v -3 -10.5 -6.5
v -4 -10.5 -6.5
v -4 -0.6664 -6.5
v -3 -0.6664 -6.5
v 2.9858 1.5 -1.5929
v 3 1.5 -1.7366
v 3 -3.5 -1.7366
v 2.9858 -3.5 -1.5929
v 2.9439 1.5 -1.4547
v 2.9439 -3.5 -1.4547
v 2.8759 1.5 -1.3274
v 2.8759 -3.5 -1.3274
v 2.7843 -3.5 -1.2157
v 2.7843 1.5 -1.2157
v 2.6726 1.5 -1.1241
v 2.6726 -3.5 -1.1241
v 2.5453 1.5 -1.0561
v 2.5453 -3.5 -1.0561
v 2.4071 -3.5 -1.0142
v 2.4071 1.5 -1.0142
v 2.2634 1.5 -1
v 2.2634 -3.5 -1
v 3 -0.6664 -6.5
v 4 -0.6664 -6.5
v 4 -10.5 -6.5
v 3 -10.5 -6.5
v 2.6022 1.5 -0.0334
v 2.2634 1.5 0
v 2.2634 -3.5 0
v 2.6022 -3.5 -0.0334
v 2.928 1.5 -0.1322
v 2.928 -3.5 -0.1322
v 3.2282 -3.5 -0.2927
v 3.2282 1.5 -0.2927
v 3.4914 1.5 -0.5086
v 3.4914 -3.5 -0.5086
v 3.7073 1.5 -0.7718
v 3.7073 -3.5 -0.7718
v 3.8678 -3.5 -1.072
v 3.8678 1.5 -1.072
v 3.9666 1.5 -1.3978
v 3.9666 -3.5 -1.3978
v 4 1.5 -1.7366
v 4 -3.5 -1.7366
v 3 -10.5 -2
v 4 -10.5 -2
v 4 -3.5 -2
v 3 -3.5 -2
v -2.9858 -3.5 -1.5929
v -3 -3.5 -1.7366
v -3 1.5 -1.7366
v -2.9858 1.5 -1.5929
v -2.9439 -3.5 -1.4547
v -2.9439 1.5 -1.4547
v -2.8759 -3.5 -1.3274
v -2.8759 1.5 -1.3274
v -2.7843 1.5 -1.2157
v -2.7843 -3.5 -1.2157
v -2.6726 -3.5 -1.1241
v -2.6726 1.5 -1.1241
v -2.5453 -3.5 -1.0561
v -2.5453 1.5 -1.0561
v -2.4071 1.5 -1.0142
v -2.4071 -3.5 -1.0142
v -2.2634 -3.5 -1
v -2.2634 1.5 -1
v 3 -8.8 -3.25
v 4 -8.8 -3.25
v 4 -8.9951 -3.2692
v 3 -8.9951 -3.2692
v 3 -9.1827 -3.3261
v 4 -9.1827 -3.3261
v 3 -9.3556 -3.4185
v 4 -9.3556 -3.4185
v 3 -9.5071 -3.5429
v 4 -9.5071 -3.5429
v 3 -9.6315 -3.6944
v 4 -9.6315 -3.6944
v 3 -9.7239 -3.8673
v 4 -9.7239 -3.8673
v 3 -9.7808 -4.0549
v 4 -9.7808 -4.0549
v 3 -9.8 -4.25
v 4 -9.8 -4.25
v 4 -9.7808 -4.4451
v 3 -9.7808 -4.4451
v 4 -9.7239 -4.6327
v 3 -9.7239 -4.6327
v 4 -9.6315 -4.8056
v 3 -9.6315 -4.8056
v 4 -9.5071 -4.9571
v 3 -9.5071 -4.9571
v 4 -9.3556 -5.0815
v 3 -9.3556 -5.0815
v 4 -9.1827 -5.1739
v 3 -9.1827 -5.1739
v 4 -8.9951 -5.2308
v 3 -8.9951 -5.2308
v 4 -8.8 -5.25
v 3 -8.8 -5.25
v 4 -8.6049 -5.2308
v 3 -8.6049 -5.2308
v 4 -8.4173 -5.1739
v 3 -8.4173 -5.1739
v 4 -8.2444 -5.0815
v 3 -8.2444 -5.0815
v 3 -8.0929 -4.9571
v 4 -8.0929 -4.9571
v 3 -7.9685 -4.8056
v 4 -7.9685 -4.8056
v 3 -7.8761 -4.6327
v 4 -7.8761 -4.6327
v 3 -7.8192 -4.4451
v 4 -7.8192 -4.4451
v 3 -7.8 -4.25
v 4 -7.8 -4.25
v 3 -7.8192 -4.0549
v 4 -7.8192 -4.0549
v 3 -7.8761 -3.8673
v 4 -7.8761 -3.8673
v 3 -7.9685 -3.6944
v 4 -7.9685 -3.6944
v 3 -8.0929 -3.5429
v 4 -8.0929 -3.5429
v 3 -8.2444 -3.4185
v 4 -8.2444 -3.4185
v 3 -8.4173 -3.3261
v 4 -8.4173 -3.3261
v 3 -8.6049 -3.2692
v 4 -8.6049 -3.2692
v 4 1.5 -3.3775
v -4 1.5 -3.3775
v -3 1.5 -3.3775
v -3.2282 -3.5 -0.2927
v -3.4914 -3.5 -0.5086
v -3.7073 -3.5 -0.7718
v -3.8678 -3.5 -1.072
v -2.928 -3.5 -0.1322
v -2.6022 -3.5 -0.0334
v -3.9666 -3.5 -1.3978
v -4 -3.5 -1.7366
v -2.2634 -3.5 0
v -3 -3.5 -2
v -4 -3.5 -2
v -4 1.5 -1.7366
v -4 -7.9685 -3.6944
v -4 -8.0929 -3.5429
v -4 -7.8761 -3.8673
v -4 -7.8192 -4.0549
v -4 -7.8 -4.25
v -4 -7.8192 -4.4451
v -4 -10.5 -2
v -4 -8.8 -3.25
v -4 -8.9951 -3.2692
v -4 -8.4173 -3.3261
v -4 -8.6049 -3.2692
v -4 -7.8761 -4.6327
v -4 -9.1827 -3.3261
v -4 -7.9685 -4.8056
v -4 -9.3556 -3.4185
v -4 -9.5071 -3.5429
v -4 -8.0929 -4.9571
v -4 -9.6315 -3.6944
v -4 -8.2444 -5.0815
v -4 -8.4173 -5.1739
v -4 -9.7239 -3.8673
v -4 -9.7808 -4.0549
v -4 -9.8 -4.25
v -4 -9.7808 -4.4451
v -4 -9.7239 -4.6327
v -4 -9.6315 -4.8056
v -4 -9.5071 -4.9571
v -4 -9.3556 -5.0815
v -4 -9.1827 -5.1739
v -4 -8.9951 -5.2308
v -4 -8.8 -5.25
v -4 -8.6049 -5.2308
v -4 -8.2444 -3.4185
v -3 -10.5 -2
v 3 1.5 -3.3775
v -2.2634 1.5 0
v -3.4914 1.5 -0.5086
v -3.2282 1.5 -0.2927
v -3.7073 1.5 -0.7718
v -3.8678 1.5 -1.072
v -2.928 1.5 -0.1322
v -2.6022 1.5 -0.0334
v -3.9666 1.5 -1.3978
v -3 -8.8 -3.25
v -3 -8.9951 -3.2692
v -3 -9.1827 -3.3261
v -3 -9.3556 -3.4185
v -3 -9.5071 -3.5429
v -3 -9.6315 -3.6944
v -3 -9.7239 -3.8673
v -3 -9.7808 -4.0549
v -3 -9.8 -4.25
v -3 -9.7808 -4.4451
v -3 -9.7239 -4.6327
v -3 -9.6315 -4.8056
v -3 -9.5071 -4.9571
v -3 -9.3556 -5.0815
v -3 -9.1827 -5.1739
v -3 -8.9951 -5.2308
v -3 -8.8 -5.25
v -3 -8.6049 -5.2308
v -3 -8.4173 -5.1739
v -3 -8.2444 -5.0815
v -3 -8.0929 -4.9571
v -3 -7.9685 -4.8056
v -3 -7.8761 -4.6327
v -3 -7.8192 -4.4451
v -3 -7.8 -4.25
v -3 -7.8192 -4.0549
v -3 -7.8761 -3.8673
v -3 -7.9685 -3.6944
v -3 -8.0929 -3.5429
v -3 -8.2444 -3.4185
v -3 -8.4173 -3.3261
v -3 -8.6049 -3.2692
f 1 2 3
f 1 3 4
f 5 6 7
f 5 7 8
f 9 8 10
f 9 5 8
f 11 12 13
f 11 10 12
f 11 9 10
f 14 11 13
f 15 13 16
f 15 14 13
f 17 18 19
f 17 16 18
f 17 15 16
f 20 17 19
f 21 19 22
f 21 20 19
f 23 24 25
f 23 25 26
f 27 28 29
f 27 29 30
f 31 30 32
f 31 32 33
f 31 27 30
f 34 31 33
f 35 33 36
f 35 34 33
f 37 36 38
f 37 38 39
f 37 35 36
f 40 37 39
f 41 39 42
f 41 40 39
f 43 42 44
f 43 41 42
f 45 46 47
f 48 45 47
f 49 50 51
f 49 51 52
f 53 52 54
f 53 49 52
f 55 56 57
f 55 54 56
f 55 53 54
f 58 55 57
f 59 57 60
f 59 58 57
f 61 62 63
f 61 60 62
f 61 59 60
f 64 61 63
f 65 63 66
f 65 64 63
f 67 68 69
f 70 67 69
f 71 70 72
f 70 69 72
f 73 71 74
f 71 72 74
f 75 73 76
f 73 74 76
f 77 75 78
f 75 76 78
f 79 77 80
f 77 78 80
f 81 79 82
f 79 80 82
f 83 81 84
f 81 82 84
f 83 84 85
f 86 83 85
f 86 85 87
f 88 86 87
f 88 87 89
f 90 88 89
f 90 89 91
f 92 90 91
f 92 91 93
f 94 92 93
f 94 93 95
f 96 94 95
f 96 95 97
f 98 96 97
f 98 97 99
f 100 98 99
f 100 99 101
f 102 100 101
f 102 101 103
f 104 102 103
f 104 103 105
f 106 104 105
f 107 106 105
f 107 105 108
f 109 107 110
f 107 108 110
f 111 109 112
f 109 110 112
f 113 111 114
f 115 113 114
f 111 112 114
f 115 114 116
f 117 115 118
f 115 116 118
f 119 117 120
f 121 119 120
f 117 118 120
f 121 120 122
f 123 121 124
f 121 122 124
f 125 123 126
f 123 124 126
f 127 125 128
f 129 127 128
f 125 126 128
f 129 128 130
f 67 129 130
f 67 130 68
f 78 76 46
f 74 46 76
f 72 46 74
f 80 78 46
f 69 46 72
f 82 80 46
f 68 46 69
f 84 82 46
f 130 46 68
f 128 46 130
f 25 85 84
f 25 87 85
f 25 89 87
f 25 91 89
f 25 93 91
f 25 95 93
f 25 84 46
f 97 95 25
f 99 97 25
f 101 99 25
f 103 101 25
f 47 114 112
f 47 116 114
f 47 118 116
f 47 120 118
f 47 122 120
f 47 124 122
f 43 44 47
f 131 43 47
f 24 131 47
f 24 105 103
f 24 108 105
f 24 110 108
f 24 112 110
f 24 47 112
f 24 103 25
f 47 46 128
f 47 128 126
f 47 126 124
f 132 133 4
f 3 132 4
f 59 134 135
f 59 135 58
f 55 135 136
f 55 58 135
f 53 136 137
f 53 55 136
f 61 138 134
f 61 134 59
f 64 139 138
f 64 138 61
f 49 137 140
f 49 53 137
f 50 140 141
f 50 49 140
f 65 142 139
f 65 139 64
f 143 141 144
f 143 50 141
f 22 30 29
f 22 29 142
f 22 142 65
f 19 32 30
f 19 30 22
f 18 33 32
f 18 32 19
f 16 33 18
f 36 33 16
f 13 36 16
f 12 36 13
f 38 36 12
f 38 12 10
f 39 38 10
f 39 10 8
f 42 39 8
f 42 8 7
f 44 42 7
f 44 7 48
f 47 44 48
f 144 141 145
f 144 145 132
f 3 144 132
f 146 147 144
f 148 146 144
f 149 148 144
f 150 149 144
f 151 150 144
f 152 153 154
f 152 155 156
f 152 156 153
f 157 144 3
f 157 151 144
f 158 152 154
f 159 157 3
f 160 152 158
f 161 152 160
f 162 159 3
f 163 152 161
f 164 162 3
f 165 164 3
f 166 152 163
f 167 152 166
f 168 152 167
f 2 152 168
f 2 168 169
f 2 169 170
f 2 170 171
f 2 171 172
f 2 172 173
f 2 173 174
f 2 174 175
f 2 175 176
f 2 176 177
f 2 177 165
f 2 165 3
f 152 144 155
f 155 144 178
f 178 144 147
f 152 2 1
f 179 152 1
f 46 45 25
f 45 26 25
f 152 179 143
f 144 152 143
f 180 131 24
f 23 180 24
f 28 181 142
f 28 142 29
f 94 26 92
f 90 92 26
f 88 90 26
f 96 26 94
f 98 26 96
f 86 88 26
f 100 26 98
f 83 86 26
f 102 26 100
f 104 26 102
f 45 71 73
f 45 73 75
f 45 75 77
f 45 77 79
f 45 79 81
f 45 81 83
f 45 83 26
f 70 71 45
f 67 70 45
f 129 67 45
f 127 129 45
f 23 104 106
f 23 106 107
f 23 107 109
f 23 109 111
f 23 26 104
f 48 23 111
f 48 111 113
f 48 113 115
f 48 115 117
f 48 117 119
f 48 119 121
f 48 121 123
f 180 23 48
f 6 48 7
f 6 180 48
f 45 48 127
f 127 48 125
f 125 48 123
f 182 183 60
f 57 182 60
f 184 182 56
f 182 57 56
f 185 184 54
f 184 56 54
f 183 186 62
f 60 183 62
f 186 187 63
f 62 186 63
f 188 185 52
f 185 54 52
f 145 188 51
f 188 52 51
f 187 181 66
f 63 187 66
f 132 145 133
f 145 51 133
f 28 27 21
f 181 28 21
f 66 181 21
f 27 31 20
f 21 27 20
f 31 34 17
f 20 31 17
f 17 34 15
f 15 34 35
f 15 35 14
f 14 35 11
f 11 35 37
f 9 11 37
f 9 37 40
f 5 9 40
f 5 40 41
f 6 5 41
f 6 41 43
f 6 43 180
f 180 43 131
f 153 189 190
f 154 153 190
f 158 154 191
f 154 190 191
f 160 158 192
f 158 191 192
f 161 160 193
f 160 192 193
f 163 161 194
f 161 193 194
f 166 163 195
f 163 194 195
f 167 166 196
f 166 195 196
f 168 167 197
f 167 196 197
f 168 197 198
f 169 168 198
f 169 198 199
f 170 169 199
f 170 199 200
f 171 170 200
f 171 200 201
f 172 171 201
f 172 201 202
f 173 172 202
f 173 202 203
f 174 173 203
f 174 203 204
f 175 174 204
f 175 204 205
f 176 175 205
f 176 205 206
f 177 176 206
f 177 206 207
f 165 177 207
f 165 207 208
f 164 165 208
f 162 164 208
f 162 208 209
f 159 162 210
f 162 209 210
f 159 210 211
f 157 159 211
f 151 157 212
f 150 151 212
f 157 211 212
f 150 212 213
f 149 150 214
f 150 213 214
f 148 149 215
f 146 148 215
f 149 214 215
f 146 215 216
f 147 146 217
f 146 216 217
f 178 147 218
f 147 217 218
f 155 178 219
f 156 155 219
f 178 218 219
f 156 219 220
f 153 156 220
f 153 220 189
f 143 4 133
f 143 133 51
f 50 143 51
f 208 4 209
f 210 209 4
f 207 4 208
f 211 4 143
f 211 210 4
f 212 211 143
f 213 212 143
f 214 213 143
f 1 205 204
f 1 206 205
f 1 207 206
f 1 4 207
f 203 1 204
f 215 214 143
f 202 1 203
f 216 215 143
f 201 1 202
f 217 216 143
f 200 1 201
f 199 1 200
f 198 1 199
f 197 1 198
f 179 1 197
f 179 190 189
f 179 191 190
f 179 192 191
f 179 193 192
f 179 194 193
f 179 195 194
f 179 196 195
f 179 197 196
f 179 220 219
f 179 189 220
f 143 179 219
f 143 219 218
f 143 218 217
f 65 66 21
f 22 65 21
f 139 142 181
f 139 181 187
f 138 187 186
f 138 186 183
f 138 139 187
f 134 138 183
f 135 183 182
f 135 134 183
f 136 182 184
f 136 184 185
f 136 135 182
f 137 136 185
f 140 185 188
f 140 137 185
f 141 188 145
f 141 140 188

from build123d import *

# Parameters (mm, degrees)
CROQUIS1_W                         = 8
CROQUIS1_H                         = 21
BRIDA_BASE1_DEPTH                  = 1
BRIDA_DE_ARISTA1_STRIP_W           = 5.4732
BRIDA_DE_ARISTA1_STRIP_H           = 1
BRIDA_DE_ARISTA1_STRIP_CUT_DEPTH   = 21
BRIDA_DE_ARISTA1_STRIP_2_W         = 5.4732
BRIDA_DE_ARISTA1_STRIP_2_H         = 1
BRIDA_DE_ARISTA1_STRIP_CUT_2_DEPTH = 21
BRIDA_DE_ARISTA1_DEPTH             = 21
BRIDA_DE_ARISTA1_BEND_DEPTH        = 21
CROQUIS34_W                        = 2
CROQUIS34_H                        = 7
CORTAR_EXTRUIR1_DEPTH              = 10
CORTAR_EXTRUIR2_REACH              = 16.714
CROQUIS35_R                        = 1
CORTAR_EXTRUIR3_DEPTH              = 10


# Sheet-metal steps are written as plain solids
with BuildPart() as part:
    # Croquis1 → Brida base1 (new body)
    with BuildSketch(Plane.XY):
        Rectangle(CROQUIS1_W, CROQUIS1_H)
    extrude(amount=-BRIDA_BASE1_DEPTH)

    # Brida de arista1 strip (across the edge) → Brida de arista1 strip cut (cut)
    with BuildSketch(Plane(origin=(-4, -10.5, -1), x_dir=(1, 0, 0), z_dir=(0, 1, 0))):
        with Locations((-1, -0.5)):
            Rectangle(BRIDA_DE_ARISTA1_STRIP_W, BRIDA_DE_ARISTA1_STRIP_H)
    extrude(amount=BRIDA_DE_ARISTA1_STRIP_CUT_DEPTH, mode=Mode.SUBTRACT)

    # Brida de arista1 strip 2 (across the edge) → Brida de arista1 strip cut 2 (cut)
    with BuildSketch(Plane(origin=(4, 10.5, -1), x_dir=(-1, 0, 0), z_dir=(0, -1, 0))):
        with Locations((-1, -0.5)):
            Rectangle(BRIDA_DE_ARISTA1_STRIP_2_W, BRIDA_DE_ARISTA1_STRIP_2_H)
    extrude(amount=BRIDA_DE_ARISTA1_STRIP_CUT_2_DEPTH, mode=Mode.SUBTRACT)

    # Brida de arista1 section (across the edge) → Brida de arista1 (add)
    with BuildSketch(Plane(origin=(-4, -10.5, -1), x_dir=(1, 0, 0), z_dir=(0, 1, 0))):
        with BuildLine():
            Line((0, 0.7366), (0, 5.5))
            Line((0, 5.5), (1, 5.5))
            Line((1, 5.5), (1, 0.7366))
            ThreePointArc((1, 0.7366), (1.215745145, 0.215745145), (1.7366, 0))
            Line((1.7366, 0), (1.7366, -1))
            ThreePointArc((1.7366, -1), (0.508638364, -0.491361636), (0, 0.7366))
        make_face()
    extrude(amount=BRIDA_DE_ARISTA1_DEPTH)

    # Brida de arista1 section 2 (across the edge) → Brida de arista1 bend (add)
    with BuildSketch(Plane(origin=(4, 10.5, -1), x_dir=(-1, 0, 0), z_dir=(0, -1, 0))):
        with BuildLine():
            Line((0, 0.7366), (0, 5.5))
            Line((0, 5.5), (1, 5.5))
            Line((1, 5.5), (1, 0.7366))
            ThreePointArc((1, 0.7366), (1.215745145, 0.215745145), (1.7366, 0))
            Line((1.7366, 0), (1.7366, -1))
            ThreePointArc((1.7366, -1), (0.508638364, -0.491361636), (0, 0.7366))
        make_face()
    extrude(amount=BRIDA_DE_ARISTA1_BEND_DEPTH)

    # Croquis34 → Cortar-Extruir1 (cut)
    with BuildSketch(Plane(origin=(4, 0, 0), x_dir=(0, 0, -1), z_dir=(1, 0, 0))):
        with Locations((1, 7)):
            Rectangle(CROQUIS34_W, CROQUIS34_H)
        with Locations((1, -7)):
            Rectangle(CROQUIS34_W, CROQUIS34_H)
    extrude(amount=-CORTAR_EXTRUIR1_DEPTH, mode=Mode.SUBTRACT)

    # Cortar-Extruir2: up to this face of the body (flat: up to its plane)
    cortar_extruir2_end = Plane(part.part.faces().sort_by_distance((-4, 0, -4.204419709))[0])
    # Croquis35 → Cortar-Extruir2 (cut, up to the picked face)
    with BuildSketch(Plane(origin=(4, 0, 0), x_dir=(0, 0, -1), z_dir=(1, 0, 0)), mode=Mode.PRIVATE) as cortar_extruir2_sk1:
        with Locations((4.25, 8.8)):
            Circle(CROQUIS35_R)
    cortar_extruir2_tool1 = split(extrude(cortar_extruir2_sk1.sketch, amount=-CORTAR_EXTRUIR2_REACH, mode=Mode.PRIVATE), bisect_by=cortar_extruir2_end, keep=Keep.BOTH, mode=Mode.PRIVATE)
    # Croquis35 → Cortar-Extruir2 (cut, up to the picked face)
    with BuildSketch(Plane(origin=(4, 0, 0), x_dir=(0, 0, -1), z_dir=(1, 0, 0)), mode=Mode.PRIVATE) as cortar_extruir2_sk2:
        with Locations(Location((4.25, -8.8, 0), (0, 0, 180))):
            Circle(CROQUIS35_R)
    cortar_extruir2_tool2 = split(extrude(cortar_extruir2_sk2.sketch, amount=-CORTAR_EXTRUIR2_REACH, mode=Mode.PRIVATE), bisect_by=cortar_extruir2_end, keep=Keep.BOTH, mode=Mode.PRIVATE)
    add(cortar_extruir2_tool1.solids().sort_by(Axis((4, 8.8, -4.25), (-1, 0, 0)))[0], mode=Mode.SUBTRACT)
    add(cortar_extruir2_tool2.solids().sort_by(Axis((4, -8.8, -4.25), (-1, 0, 0)))[0], mode=Mode.SUBTRACT)

    # Croquis36 → Cortar-Extruir3 (cut)
    with BuildSketch(Plane(origin=(4, 0, 0), x_dir=(0, 0, -1), z_dir=(1, 0, 0))):
        Polygon((0, 1.5), (3.377527081, 1.5), (6.5, -0.666434932), (6.5, 11.157411488), (0, 11.157411488), align=None)
    extrude(amount=-CORTAR_EXTRUIR3_DEPTH, mode=Mode.SUBTRACT)


solid = part.part
